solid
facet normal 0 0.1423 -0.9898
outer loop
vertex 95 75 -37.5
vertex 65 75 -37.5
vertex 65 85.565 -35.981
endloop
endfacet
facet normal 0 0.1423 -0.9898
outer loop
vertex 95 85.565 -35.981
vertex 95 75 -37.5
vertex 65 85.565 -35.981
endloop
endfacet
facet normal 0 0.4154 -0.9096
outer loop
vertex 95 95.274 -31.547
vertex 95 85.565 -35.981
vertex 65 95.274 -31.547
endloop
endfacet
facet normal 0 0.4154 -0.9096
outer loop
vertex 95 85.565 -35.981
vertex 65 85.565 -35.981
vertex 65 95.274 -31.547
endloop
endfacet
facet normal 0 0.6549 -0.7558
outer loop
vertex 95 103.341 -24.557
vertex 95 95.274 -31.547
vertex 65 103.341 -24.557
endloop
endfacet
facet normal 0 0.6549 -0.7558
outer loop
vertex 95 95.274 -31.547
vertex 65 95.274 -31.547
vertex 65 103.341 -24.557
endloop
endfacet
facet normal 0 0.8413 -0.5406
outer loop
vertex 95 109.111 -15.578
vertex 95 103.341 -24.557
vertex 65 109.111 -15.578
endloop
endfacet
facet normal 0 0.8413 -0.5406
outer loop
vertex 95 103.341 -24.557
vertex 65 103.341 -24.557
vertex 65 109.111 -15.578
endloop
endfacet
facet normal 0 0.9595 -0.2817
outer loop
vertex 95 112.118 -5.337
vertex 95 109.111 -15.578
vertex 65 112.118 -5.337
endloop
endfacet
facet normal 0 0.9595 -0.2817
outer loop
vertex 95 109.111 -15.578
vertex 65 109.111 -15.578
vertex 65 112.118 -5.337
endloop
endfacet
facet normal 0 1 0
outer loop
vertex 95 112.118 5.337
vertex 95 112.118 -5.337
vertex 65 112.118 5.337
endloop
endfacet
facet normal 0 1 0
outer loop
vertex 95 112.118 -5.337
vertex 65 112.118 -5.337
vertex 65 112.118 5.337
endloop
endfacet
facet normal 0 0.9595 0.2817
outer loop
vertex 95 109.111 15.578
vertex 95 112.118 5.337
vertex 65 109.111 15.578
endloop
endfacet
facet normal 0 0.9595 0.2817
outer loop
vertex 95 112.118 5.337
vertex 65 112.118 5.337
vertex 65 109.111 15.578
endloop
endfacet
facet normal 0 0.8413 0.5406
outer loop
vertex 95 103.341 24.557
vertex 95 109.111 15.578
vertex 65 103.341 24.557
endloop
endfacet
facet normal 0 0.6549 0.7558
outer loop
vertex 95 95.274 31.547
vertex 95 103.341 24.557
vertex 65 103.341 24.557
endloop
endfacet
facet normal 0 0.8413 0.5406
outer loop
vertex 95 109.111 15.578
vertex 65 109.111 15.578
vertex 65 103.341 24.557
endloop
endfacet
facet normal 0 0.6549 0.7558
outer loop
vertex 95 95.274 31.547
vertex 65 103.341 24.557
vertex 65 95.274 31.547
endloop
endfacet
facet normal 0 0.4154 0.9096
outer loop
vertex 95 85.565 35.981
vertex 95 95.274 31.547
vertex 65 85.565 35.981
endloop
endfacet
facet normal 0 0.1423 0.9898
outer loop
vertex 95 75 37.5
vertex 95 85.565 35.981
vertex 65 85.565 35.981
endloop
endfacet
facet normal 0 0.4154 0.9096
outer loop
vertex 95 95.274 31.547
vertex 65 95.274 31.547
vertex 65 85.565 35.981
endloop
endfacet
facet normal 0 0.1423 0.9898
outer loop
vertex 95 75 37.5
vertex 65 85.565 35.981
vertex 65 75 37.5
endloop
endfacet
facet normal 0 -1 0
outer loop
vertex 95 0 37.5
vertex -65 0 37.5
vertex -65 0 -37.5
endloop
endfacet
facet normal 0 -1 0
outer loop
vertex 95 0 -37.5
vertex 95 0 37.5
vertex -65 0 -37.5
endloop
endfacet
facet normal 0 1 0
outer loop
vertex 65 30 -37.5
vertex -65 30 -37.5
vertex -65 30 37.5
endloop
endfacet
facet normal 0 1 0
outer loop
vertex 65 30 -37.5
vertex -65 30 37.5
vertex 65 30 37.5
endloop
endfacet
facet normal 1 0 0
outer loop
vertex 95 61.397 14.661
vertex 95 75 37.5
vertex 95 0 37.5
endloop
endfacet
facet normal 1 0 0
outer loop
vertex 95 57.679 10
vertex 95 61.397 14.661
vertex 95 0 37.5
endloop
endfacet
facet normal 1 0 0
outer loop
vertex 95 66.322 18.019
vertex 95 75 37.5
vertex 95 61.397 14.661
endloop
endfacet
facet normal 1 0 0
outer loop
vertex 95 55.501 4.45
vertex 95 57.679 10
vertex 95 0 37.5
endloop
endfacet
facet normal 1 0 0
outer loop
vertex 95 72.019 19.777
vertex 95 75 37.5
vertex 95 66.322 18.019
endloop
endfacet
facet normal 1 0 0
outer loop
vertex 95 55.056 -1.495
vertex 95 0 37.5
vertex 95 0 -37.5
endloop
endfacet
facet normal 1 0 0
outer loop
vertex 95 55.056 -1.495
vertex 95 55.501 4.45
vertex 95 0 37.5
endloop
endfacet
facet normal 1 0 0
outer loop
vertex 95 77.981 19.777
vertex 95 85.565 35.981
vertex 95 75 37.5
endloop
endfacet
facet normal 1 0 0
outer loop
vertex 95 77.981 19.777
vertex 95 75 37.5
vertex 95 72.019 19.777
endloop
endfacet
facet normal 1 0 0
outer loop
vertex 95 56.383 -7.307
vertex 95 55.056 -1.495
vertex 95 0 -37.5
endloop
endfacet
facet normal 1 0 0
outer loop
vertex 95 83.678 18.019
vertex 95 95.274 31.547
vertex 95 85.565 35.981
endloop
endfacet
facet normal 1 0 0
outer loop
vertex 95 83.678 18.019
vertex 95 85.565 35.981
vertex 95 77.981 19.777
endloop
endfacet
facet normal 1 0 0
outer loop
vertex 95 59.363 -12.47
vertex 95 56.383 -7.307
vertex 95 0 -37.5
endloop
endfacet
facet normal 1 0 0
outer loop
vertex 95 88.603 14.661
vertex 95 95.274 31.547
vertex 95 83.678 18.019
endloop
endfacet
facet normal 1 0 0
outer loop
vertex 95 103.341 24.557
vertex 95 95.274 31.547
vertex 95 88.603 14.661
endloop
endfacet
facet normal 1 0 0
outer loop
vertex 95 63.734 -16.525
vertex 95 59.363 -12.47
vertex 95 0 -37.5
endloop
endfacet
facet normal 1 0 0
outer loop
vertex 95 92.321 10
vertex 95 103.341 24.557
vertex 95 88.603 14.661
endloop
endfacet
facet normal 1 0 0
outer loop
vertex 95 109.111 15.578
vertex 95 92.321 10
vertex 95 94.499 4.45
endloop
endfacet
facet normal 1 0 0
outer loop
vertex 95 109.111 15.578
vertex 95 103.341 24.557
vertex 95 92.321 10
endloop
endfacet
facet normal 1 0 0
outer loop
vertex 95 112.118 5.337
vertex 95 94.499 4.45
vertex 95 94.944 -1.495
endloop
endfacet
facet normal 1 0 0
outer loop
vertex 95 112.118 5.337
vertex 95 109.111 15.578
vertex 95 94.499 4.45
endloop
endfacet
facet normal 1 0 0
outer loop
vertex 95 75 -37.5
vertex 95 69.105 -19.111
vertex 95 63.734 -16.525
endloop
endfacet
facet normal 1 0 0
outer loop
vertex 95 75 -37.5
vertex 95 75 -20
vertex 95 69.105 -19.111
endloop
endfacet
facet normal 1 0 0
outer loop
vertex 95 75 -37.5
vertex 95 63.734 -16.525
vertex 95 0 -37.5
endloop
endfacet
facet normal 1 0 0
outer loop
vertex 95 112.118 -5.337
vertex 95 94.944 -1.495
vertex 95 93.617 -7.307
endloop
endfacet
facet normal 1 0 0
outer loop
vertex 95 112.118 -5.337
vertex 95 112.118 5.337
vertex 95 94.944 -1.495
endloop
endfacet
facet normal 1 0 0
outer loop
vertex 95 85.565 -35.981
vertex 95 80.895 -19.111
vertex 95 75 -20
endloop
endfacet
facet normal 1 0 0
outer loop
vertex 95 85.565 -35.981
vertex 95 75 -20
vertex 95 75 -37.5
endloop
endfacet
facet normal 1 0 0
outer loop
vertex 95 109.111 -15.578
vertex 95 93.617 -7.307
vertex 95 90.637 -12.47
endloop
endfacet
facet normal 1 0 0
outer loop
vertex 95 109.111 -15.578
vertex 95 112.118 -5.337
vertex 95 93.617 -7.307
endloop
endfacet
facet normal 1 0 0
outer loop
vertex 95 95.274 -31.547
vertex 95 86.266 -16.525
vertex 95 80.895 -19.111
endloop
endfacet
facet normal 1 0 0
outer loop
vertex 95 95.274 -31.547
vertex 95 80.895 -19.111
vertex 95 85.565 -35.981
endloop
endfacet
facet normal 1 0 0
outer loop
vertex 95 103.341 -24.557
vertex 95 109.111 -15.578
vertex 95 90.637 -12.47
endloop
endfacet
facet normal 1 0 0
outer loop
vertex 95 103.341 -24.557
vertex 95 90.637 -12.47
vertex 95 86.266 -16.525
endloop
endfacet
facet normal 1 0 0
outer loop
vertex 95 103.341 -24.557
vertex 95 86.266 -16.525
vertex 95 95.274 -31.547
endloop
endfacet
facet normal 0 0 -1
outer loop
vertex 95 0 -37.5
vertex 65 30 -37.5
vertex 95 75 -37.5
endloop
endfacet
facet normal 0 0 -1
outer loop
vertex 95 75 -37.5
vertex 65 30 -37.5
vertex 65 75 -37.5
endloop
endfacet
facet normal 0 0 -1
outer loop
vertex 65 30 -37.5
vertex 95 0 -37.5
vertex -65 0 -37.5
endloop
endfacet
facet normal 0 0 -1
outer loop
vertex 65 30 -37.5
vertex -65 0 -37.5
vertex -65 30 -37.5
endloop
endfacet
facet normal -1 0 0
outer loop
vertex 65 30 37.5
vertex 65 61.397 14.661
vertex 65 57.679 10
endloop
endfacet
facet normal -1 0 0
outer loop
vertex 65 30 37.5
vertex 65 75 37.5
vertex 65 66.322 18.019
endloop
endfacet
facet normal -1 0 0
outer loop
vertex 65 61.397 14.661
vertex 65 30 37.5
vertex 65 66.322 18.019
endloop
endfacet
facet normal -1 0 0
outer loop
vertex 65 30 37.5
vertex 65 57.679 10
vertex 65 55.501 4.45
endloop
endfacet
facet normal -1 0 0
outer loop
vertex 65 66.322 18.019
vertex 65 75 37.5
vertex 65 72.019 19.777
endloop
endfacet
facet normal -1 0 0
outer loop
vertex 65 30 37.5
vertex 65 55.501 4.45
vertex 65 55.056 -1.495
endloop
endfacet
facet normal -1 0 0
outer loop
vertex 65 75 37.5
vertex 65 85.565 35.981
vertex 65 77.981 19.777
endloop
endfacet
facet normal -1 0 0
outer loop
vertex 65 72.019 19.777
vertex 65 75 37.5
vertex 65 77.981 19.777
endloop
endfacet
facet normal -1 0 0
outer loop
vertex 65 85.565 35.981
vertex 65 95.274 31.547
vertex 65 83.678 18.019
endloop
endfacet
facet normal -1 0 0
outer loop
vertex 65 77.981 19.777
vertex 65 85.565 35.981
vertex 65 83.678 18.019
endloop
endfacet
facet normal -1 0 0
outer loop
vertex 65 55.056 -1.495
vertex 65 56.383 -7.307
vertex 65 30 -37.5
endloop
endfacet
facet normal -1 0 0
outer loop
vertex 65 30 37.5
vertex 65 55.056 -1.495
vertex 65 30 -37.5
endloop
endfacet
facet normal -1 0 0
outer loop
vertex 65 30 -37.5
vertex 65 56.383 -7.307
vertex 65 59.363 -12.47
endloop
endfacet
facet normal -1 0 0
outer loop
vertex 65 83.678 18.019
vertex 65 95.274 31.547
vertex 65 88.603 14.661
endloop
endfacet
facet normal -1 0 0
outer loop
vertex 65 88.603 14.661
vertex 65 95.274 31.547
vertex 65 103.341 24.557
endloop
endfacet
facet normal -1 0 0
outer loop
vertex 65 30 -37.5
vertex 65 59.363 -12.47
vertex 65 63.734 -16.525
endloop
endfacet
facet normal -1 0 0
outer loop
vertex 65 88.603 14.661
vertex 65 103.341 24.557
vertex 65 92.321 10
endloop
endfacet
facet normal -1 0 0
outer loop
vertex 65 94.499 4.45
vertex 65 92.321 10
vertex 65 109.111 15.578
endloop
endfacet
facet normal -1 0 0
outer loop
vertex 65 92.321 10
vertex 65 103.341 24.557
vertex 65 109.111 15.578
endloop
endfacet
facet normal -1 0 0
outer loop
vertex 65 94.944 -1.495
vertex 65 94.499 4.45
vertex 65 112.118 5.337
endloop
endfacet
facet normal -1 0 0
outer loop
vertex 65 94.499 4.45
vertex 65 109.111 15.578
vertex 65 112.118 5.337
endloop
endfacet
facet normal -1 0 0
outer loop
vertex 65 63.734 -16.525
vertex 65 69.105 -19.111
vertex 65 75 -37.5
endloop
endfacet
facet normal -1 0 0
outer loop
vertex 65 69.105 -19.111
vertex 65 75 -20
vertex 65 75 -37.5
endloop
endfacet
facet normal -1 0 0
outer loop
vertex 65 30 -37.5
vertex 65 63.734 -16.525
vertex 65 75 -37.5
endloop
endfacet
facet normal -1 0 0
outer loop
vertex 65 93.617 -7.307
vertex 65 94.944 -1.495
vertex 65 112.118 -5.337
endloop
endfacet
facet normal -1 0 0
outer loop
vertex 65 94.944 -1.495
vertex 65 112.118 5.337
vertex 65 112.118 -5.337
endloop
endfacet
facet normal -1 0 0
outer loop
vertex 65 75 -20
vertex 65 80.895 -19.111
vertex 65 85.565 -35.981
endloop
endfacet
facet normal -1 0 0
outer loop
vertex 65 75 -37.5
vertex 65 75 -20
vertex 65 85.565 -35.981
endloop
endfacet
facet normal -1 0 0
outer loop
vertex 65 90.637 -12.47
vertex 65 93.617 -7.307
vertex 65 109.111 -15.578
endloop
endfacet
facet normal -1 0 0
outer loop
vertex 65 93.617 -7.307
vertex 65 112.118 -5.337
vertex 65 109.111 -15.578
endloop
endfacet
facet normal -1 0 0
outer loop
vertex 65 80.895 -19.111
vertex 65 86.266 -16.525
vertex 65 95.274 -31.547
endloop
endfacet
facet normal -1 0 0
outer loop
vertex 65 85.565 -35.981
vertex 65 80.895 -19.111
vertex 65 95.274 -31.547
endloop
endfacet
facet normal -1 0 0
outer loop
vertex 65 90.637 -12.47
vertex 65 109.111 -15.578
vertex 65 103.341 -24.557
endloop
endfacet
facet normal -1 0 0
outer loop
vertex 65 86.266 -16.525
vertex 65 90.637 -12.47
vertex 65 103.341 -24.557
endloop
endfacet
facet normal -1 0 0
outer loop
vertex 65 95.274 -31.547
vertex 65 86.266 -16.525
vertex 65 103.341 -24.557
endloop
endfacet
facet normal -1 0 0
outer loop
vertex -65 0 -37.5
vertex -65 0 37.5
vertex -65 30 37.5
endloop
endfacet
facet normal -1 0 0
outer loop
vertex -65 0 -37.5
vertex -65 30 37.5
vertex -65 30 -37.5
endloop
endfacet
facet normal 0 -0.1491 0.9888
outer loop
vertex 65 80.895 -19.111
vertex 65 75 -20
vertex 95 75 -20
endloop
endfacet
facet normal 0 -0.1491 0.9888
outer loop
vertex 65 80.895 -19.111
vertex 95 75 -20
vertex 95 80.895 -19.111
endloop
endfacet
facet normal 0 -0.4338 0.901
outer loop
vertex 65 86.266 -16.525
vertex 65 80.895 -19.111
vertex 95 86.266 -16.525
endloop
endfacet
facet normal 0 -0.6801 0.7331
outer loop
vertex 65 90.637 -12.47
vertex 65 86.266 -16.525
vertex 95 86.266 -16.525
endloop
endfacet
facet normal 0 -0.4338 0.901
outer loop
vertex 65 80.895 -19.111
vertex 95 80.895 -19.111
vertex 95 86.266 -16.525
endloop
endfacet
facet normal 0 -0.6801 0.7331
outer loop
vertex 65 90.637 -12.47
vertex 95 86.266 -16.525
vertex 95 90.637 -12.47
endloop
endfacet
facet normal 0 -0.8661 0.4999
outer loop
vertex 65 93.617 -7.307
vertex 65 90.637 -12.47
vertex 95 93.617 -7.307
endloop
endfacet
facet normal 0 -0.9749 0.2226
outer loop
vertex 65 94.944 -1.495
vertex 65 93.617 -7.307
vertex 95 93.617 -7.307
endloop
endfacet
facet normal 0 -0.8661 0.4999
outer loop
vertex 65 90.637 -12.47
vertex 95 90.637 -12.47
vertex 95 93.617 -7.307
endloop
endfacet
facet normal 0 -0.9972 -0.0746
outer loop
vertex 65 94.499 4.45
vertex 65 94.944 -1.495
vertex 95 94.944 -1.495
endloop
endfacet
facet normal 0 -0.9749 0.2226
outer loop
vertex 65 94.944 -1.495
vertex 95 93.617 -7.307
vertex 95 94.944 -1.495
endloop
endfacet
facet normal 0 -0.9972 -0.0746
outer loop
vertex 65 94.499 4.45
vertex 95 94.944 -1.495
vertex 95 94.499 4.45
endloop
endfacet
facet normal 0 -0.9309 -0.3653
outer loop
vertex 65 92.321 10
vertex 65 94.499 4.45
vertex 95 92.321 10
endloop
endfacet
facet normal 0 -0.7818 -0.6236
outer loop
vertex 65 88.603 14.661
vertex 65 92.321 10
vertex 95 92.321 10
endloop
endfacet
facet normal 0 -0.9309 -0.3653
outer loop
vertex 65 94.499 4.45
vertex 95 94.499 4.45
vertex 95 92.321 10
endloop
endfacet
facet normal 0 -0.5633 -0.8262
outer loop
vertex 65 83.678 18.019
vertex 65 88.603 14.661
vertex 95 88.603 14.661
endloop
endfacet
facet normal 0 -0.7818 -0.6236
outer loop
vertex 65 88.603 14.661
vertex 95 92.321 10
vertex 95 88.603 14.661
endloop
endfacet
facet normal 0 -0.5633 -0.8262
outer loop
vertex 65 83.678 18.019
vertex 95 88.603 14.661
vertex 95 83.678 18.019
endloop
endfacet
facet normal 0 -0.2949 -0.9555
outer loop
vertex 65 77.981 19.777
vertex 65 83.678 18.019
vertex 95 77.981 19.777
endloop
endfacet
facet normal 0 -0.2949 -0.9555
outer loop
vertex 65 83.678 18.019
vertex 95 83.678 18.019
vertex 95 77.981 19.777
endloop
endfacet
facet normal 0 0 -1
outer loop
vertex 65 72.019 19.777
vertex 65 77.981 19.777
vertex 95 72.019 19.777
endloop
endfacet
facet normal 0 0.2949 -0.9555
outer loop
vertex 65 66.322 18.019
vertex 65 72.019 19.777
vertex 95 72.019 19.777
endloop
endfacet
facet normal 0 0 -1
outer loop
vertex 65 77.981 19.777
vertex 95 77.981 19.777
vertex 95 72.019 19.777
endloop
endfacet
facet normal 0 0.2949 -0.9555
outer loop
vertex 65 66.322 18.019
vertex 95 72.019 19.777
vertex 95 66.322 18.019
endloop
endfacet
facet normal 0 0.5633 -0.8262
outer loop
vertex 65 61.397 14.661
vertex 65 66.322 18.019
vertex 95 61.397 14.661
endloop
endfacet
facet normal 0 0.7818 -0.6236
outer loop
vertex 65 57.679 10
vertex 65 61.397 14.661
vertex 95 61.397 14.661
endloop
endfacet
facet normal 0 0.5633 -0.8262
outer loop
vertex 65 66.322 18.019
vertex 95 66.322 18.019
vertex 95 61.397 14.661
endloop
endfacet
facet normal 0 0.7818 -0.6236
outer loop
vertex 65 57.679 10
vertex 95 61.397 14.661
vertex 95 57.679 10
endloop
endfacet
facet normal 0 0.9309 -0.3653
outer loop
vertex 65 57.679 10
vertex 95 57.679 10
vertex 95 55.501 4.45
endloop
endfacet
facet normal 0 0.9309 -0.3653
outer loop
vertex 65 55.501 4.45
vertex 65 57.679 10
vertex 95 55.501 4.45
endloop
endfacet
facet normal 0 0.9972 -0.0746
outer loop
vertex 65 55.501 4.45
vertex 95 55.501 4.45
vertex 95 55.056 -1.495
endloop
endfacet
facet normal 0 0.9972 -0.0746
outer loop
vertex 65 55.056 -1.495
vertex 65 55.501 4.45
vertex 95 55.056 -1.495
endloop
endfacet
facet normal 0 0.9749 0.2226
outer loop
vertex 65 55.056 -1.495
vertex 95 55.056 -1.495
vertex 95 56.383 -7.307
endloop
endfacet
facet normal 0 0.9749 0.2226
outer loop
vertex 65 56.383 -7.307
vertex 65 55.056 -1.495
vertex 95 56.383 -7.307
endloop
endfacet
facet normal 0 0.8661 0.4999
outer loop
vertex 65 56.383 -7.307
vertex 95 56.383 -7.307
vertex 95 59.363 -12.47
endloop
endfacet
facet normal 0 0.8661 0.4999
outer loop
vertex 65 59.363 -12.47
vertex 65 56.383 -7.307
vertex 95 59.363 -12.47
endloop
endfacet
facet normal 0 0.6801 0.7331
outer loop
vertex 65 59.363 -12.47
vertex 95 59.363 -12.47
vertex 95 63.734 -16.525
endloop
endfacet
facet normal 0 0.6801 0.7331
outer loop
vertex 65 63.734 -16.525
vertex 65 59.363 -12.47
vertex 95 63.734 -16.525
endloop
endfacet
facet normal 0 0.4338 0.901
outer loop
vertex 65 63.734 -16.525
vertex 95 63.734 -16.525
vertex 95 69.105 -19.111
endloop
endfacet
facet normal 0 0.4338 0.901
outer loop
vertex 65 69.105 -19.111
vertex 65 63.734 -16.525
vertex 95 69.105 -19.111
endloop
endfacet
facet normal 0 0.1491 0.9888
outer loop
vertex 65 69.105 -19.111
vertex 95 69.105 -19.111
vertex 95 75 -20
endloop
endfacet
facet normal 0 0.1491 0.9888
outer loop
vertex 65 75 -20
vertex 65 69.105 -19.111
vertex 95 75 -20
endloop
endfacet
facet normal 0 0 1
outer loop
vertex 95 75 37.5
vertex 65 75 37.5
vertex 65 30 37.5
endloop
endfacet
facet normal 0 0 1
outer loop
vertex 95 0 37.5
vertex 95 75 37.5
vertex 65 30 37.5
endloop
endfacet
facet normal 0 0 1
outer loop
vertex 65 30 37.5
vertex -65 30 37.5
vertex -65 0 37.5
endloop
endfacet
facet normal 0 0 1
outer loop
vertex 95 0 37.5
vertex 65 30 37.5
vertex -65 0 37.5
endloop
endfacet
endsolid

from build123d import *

# Parameters (mm, degrees)
CROQUIS1_W              = 130
CROQUIS1_H              = 75
SALIENTE_EXTRUIR1_DEPTH = 30
SALIENTE_EXTRUIR2_DEPTH = 30
CROQUIS3_R              = 20
CORTAR_EXTRUIR1_DEPTH   = 62


with BuildPart() as part:
    # Croquis1 → Saliente-Extruir1 (new body)
    with BuildSketch(Plane(origin=(0, 0, 0), x_dir=(1, 0, 0), z_dir=(0, 1, 0))):
        Rectangle(CROQUIS1_W, CROQUIS1_H)
    extrude(amount=SALIENTE_EXTRUIR1_DEPTH)

    # Croquis2 → Saliente-Extruir2 (add)
    with BuildSketch(Plane(origin=(65, 0, 0), x_dir=(0, 0, -1), z_dir=(1, 0, 0))):
        with BuildLine():
            Line((-37.5, 0), (37.5, 0))
            Line((37.5, 0), (37.5, 75))
            ThreePointArc((37.5, 75), (0, 112.5), (-37.5, 75))
            Line((-37.5, 75), (-37.5, 0))
        make_face()
    extrude(amount=SALIENTE_EXTRUIR2_DEPTH)

    # Croquis3 → Cortar-Extruir1 (cut)
    with BuildSketch(Plane(origin=(95, 0, 0), x_dir=(0, 0, -1), z_dir=(1, 0, 0))):
        with Locations((0, 75)):
            Circle(CROQUIS3_R)
    extrude(amount=-CORTAR_EXTRUIR1_DEPTH, mode=Mode.SUBTRACT)


solid = part.part
